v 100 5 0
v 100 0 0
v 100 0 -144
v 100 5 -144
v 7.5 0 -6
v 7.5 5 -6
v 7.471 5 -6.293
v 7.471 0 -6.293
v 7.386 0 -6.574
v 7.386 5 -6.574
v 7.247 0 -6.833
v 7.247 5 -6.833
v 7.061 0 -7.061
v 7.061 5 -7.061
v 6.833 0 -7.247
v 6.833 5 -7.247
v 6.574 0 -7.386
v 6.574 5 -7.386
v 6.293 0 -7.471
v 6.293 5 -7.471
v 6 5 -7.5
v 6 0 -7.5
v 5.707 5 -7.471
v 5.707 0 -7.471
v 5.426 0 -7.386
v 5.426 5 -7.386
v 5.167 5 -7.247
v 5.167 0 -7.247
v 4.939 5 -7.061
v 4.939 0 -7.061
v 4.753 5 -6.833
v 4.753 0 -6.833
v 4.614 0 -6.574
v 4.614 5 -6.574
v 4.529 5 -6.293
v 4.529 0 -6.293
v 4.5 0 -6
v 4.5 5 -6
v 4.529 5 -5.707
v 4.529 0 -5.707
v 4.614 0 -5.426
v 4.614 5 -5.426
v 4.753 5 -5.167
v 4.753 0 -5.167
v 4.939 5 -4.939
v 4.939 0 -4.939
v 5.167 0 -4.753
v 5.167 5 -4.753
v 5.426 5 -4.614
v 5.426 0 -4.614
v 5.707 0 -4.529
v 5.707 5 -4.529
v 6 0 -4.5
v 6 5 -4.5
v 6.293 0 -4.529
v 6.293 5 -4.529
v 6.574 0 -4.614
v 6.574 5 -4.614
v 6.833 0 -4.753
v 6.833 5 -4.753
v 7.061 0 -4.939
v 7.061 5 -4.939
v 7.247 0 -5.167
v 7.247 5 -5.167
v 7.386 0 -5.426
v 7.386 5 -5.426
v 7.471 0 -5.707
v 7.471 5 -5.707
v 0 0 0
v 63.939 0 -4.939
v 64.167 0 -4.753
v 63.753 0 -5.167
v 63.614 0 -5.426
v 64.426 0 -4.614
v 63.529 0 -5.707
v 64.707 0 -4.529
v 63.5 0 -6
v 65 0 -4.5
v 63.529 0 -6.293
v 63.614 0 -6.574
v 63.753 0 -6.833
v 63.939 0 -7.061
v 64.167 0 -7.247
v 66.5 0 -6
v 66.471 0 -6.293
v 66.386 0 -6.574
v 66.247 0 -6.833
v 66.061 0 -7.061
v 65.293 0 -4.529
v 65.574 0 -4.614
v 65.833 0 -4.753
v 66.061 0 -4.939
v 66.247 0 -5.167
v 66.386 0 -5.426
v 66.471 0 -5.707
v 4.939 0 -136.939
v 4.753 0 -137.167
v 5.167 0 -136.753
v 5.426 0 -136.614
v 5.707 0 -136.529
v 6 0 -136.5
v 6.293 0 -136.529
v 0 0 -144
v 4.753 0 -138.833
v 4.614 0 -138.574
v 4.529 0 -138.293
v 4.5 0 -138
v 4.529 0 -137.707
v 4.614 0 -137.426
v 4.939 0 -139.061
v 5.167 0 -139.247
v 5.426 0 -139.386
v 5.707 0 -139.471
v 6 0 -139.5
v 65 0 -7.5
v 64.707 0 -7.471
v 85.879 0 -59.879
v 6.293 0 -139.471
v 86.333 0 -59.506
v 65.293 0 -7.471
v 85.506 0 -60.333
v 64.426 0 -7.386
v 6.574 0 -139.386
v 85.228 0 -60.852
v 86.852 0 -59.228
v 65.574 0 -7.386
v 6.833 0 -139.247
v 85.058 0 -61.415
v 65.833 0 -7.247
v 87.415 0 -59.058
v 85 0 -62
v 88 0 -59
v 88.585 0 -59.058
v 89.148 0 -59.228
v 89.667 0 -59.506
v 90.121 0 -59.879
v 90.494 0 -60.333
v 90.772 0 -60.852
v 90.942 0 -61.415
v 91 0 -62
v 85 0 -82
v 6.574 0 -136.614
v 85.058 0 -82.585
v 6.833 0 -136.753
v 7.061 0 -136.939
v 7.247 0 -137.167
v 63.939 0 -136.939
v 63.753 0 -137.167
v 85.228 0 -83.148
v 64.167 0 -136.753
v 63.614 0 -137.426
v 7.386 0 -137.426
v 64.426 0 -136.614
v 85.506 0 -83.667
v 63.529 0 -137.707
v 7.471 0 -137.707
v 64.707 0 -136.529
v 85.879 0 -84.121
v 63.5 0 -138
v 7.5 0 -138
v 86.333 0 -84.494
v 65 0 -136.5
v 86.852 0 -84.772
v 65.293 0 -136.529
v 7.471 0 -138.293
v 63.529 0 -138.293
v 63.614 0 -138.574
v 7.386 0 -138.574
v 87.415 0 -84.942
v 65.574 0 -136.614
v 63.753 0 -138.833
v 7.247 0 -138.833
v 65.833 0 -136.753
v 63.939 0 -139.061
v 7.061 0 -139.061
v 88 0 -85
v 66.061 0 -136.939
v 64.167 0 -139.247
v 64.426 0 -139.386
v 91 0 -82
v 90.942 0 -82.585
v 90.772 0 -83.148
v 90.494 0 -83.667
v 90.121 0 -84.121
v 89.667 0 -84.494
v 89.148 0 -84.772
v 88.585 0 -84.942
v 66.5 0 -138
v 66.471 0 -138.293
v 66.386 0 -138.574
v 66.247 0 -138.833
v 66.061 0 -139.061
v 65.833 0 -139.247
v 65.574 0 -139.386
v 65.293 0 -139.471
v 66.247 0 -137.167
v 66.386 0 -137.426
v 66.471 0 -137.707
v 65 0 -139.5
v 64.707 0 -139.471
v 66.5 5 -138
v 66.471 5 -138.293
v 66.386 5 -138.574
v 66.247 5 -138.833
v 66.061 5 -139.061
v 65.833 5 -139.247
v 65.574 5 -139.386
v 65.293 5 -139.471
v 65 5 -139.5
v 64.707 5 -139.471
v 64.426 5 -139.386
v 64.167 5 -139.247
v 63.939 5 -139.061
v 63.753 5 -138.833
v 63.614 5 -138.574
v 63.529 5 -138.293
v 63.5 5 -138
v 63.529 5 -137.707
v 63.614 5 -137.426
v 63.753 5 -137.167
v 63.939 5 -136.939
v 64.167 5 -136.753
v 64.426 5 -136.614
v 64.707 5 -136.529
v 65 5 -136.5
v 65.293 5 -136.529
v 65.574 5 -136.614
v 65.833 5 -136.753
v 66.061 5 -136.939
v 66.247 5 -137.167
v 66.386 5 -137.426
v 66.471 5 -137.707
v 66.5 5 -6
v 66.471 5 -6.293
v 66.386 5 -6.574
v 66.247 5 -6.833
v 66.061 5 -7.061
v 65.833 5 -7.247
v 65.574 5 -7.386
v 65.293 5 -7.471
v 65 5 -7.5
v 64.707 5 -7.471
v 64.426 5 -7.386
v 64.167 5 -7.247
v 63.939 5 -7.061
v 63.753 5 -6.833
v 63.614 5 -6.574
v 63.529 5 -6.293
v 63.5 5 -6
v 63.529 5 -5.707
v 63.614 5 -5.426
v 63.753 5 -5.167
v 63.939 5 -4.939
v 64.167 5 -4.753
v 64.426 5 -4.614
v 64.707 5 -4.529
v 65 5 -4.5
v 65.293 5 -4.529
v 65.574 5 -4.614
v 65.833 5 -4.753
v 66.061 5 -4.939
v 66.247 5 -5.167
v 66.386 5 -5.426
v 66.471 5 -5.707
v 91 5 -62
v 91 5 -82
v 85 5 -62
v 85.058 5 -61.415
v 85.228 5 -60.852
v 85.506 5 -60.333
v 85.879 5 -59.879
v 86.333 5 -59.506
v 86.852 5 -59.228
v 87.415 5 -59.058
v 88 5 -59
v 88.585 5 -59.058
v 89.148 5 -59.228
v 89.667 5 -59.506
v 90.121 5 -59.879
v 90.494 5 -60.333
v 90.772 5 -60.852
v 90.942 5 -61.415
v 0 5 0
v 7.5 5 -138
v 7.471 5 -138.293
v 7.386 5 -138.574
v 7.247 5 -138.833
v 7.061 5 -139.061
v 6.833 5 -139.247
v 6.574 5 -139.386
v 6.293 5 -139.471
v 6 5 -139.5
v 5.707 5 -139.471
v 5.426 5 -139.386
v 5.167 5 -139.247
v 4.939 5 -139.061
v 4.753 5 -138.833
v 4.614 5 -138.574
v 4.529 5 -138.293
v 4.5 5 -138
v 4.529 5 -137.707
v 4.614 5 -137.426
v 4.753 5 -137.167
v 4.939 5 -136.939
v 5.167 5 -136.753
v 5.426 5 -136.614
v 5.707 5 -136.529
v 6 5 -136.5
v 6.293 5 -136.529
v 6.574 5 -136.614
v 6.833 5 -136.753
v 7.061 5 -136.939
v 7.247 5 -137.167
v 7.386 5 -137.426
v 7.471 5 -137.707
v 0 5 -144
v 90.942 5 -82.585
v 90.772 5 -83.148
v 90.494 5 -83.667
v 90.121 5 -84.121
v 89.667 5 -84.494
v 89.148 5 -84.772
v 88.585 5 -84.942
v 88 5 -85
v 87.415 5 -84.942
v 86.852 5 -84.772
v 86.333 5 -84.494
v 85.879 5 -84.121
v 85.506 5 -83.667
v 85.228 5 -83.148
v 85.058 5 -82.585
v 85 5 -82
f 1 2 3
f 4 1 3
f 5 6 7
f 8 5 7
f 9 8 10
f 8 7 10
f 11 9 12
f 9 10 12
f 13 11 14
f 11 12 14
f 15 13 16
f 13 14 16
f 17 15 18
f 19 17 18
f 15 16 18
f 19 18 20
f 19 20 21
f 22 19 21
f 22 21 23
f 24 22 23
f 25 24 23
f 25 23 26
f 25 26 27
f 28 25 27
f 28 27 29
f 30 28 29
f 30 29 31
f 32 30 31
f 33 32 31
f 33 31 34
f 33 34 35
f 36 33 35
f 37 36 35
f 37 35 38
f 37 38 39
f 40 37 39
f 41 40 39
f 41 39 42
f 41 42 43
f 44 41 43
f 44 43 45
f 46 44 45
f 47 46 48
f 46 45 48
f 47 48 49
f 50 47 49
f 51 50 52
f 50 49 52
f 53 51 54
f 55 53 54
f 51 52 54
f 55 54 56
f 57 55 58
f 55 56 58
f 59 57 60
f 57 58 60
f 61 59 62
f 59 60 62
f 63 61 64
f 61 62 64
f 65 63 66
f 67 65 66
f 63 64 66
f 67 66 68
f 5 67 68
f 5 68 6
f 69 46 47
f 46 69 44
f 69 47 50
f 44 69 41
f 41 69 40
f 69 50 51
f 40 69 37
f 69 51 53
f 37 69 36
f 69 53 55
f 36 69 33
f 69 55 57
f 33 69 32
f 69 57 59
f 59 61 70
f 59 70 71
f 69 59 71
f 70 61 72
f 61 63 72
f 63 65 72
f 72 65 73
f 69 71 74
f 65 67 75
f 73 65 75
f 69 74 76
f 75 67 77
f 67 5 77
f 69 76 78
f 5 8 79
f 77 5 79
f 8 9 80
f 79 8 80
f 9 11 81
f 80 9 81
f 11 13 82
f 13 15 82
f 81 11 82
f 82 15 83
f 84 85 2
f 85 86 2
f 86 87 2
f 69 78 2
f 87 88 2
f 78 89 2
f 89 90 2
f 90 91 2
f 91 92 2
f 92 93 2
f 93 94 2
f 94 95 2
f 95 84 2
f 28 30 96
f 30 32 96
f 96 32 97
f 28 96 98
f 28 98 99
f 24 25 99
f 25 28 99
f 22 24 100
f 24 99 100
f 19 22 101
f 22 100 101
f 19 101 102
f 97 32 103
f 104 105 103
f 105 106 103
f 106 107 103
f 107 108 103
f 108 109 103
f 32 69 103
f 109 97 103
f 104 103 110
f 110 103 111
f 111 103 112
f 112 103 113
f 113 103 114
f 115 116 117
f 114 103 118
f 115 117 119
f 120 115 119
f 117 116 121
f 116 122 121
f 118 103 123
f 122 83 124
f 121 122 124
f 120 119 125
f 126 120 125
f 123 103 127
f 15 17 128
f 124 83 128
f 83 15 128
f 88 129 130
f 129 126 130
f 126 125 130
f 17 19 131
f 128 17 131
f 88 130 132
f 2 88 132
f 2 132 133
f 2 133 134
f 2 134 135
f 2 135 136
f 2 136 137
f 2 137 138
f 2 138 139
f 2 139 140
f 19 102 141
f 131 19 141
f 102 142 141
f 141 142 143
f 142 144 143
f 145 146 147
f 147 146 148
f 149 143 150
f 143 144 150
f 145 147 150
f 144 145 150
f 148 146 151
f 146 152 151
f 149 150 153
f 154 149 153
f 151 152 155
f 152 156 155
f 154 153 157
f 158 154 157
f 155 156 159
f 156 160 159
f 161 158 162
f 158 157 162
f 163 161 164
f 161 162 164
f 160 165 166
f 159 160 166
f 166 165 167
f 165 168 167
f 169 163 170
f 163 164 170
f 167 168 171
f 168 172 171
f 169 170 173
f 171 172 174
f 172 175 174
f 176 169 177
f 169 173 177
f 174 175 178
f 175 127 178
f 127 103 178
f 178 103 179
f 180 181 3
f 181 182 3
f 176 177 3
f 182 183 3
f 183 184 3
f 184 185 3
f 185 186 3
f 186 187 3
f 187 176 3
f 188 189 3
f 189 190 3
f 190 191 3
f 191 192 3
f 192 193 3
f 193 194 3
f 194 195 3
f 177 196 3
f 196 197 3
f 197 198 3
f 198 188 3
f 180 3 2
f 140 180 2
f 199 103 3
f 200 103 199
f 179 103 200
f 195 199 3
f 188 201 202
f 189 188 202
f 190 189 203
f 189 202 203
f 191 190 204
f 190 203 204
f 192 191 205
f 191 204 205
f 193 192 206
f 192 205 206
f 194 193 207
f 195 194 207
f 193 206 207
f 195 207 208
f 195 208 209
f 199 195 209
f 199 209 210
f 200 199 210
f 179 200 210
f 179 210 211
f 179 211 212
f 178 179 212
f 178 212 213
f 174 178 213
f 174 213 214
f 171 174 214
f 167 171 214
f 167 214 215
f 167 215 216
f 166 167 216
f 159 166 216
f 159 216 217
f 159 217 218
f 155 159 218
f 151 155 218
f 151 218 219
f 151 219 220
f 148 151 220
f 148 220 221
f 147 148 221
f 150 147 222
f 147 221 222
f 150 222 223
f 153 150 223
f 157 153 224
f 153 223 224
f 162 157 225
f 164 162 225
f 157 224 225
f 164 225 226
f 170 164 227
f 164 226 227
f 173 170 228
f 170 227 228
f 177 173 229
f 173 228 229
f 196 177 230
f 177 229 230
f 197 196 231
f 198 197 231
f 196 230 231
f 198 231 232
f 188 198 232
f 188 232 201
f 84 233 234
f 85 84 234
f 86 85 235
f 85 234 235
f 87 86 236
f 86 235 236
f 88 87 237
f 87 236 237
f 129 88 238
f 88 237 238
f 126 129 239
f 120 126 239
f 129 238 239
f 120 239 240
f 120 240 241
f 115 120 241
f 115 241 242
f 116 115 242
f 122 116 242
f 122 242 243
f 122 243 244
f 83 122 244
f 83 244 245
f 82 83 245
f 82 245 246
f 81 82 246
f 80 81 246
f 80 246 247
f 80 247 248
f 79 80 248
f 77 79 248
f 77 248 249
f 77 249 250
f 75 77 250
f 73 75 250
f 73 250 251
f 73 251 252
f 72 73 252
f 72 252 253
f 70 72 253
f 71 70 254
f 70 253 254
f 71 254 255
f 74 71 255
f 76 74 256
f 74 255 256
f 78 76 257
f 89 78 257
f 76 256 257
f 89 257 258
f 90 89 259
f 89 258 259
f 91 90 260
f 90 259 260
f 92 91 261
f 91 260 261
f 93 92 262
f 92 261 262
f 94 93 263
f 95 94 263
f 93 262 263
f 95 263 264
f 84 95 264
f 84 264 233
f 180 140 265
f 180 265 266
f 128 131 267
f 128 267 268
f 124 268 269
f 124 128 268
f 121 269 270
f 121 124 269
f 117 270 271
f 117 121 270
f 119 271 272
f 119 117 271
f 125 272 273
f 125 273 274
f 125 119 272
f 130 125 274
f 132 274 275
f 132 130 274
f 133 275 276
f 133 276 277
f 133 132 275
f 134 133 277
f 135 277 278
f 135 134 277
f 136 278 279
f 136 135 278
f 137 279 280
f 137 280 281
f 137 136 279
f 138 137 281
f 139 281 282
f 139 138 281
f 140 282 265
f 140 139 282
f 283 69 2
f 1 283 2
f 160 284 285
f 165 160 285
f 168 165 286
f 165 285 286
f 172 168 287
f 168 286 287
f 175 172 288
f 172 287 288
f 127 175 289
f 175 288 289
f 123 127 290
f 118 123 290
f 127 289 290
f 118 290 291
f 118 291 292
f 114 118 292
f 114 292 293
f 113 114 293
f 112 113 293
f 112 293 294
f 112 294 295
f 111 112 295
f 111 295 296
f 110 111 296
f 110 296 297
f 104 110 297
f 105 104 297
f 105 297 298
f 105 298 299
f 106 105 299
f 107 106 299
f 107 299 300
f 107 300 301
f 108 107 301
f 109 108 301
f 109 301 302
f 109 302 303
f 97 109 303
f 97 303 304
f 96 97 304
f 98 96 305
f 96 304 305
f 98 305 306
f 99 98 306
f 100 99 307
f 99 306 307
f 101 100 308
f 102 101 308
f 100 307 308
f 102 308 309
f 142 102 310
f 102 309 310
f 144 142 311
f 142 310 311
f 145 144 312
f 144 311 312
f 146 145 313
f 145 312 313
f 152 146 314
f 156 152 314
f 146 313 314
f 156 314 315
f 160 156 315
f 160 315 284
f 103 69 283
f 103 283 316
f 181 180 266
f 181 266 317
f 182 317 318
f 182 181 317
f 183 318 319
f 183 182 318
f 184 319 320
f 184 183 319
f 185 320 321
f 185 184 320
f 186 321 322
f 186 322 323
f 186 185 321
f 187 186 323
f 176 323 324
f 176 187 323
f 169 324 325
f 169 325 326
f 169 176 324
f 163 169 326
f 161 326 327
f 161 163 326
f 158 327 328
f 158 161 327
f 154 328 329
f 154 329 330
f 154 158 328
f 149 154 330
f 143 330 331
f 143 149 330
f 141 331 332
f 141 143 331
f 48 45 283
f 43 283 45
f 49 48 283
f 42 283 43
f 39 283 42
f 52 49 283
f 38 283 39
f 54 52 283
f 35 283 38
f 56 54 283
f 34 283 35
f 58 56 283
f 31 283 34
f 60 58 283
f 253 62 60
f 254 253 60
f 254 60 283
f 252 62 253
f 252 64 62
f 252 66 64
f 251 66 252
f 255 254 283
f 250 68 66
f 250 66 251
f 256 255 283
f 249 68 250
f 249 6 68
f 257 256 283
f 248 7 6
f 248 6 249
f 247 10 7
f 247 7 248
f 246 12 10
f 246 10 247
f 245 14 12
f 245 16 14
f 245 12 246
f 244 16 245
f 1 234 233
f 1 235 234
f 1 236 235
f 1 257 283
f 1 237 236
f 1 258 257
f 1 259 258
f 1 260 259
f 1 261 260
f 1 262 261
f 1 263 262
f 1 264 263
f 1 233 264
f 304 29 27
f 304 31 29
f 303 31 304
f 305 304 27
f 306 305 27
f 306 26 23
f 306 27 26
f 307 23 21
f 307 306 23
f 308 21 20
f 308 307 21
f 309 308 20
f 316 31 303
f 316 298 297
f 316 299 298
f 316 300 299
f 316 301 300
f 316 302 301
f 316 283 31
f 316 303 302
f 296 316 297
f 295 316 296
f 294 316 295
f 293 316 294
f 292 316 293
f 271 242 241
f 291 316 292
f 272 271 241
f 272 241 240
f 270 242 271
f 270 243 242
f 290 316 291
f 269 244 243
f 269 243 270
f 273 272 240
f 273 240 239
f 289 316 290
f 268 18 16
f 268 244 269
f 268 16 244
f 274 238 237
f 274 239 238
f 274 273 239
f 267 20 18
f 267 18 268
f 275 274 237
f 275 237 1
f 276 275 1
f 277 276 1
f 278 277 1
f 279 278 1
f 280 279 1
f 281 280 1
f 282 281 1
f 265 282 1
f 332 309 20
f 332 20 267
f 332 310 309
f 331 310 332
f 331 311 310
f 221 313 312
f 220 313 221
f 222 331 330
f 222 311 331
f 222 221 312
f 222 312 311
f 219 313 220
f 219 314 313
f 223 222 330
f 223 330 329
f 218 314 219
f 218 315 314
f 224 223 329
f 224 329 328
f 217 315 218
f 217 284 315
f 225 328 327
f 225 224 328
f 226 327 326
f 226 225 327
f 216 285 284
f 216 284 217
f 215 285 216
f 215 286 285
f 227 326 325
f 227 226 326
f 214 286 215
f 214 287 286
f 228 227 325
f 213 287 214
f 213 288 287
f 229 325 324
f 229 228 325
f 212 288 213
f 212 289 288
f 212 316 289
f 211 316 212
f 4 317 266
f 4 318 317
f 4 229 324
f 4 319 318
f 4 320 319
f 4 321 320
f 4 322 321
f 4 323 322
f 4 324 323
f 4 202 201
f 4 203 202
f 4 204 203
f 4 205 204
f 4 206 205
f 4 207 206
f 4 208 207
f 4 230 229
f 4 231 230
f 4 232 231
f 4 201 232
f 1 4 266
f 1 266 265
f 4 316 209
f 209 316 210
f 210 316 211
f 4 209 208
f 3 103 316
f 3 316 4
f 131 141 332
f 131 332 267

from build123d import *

# Parameters (mm, degrees)
SKETCH1_W           = 100
SKETCH1_H           = 144
BOSS_EXTRUDE1_DEPTH = 5
SKETCH2_R           = 1.5
CUT_EXTRUDE1_DEPTH  = 6


with BuildPart() as part:
    # Sketch1 → Boss-Extrude1 (new body)
    with BuildSketch(Plane(origin=(0, 0, 0), x_dir=(1, 0, 0), z_dir=(0, 1, 0))):
        with Locations((50, 72)):
            Rectangle(SKETCH1_W, SKETCH1_H)
        with BuildLine():
            Line((85, 82), (85, 62))
            ThreePointArc((85, 62), (88, 59), (91, 62))
            Line((91, 62), (91, 82))
            ThreePointArc((91, 82), (88, 85), (85, 82))
        make_face(mode=Mode.SUBTRACT)
    extrude(amount=BOSS_EXTRUDE1_DEPTH)

    # Sketch2 → Cut-Extrude1 (cut, through all)
    with BuildSketch(Plane(origin=(0, 5, 0), x_dir=(1, 0, 0), z_dir=(0, 1, 0))):
        with Locations((6, 138)):
            Circle(SKETCH2_R)
        with Locations((6, 6)):
            Circle(SKETCH2_R)
        with Locations((65, 138)):
            Circle(SKETCH2_R)
        with Locations((65, 6)):
            Circle(SKETCH2_R)
    extrude(amount=-CUT_EXTRUDE1_DEPTH, mode=Mode.SUBTRACT)


solid = part.part
